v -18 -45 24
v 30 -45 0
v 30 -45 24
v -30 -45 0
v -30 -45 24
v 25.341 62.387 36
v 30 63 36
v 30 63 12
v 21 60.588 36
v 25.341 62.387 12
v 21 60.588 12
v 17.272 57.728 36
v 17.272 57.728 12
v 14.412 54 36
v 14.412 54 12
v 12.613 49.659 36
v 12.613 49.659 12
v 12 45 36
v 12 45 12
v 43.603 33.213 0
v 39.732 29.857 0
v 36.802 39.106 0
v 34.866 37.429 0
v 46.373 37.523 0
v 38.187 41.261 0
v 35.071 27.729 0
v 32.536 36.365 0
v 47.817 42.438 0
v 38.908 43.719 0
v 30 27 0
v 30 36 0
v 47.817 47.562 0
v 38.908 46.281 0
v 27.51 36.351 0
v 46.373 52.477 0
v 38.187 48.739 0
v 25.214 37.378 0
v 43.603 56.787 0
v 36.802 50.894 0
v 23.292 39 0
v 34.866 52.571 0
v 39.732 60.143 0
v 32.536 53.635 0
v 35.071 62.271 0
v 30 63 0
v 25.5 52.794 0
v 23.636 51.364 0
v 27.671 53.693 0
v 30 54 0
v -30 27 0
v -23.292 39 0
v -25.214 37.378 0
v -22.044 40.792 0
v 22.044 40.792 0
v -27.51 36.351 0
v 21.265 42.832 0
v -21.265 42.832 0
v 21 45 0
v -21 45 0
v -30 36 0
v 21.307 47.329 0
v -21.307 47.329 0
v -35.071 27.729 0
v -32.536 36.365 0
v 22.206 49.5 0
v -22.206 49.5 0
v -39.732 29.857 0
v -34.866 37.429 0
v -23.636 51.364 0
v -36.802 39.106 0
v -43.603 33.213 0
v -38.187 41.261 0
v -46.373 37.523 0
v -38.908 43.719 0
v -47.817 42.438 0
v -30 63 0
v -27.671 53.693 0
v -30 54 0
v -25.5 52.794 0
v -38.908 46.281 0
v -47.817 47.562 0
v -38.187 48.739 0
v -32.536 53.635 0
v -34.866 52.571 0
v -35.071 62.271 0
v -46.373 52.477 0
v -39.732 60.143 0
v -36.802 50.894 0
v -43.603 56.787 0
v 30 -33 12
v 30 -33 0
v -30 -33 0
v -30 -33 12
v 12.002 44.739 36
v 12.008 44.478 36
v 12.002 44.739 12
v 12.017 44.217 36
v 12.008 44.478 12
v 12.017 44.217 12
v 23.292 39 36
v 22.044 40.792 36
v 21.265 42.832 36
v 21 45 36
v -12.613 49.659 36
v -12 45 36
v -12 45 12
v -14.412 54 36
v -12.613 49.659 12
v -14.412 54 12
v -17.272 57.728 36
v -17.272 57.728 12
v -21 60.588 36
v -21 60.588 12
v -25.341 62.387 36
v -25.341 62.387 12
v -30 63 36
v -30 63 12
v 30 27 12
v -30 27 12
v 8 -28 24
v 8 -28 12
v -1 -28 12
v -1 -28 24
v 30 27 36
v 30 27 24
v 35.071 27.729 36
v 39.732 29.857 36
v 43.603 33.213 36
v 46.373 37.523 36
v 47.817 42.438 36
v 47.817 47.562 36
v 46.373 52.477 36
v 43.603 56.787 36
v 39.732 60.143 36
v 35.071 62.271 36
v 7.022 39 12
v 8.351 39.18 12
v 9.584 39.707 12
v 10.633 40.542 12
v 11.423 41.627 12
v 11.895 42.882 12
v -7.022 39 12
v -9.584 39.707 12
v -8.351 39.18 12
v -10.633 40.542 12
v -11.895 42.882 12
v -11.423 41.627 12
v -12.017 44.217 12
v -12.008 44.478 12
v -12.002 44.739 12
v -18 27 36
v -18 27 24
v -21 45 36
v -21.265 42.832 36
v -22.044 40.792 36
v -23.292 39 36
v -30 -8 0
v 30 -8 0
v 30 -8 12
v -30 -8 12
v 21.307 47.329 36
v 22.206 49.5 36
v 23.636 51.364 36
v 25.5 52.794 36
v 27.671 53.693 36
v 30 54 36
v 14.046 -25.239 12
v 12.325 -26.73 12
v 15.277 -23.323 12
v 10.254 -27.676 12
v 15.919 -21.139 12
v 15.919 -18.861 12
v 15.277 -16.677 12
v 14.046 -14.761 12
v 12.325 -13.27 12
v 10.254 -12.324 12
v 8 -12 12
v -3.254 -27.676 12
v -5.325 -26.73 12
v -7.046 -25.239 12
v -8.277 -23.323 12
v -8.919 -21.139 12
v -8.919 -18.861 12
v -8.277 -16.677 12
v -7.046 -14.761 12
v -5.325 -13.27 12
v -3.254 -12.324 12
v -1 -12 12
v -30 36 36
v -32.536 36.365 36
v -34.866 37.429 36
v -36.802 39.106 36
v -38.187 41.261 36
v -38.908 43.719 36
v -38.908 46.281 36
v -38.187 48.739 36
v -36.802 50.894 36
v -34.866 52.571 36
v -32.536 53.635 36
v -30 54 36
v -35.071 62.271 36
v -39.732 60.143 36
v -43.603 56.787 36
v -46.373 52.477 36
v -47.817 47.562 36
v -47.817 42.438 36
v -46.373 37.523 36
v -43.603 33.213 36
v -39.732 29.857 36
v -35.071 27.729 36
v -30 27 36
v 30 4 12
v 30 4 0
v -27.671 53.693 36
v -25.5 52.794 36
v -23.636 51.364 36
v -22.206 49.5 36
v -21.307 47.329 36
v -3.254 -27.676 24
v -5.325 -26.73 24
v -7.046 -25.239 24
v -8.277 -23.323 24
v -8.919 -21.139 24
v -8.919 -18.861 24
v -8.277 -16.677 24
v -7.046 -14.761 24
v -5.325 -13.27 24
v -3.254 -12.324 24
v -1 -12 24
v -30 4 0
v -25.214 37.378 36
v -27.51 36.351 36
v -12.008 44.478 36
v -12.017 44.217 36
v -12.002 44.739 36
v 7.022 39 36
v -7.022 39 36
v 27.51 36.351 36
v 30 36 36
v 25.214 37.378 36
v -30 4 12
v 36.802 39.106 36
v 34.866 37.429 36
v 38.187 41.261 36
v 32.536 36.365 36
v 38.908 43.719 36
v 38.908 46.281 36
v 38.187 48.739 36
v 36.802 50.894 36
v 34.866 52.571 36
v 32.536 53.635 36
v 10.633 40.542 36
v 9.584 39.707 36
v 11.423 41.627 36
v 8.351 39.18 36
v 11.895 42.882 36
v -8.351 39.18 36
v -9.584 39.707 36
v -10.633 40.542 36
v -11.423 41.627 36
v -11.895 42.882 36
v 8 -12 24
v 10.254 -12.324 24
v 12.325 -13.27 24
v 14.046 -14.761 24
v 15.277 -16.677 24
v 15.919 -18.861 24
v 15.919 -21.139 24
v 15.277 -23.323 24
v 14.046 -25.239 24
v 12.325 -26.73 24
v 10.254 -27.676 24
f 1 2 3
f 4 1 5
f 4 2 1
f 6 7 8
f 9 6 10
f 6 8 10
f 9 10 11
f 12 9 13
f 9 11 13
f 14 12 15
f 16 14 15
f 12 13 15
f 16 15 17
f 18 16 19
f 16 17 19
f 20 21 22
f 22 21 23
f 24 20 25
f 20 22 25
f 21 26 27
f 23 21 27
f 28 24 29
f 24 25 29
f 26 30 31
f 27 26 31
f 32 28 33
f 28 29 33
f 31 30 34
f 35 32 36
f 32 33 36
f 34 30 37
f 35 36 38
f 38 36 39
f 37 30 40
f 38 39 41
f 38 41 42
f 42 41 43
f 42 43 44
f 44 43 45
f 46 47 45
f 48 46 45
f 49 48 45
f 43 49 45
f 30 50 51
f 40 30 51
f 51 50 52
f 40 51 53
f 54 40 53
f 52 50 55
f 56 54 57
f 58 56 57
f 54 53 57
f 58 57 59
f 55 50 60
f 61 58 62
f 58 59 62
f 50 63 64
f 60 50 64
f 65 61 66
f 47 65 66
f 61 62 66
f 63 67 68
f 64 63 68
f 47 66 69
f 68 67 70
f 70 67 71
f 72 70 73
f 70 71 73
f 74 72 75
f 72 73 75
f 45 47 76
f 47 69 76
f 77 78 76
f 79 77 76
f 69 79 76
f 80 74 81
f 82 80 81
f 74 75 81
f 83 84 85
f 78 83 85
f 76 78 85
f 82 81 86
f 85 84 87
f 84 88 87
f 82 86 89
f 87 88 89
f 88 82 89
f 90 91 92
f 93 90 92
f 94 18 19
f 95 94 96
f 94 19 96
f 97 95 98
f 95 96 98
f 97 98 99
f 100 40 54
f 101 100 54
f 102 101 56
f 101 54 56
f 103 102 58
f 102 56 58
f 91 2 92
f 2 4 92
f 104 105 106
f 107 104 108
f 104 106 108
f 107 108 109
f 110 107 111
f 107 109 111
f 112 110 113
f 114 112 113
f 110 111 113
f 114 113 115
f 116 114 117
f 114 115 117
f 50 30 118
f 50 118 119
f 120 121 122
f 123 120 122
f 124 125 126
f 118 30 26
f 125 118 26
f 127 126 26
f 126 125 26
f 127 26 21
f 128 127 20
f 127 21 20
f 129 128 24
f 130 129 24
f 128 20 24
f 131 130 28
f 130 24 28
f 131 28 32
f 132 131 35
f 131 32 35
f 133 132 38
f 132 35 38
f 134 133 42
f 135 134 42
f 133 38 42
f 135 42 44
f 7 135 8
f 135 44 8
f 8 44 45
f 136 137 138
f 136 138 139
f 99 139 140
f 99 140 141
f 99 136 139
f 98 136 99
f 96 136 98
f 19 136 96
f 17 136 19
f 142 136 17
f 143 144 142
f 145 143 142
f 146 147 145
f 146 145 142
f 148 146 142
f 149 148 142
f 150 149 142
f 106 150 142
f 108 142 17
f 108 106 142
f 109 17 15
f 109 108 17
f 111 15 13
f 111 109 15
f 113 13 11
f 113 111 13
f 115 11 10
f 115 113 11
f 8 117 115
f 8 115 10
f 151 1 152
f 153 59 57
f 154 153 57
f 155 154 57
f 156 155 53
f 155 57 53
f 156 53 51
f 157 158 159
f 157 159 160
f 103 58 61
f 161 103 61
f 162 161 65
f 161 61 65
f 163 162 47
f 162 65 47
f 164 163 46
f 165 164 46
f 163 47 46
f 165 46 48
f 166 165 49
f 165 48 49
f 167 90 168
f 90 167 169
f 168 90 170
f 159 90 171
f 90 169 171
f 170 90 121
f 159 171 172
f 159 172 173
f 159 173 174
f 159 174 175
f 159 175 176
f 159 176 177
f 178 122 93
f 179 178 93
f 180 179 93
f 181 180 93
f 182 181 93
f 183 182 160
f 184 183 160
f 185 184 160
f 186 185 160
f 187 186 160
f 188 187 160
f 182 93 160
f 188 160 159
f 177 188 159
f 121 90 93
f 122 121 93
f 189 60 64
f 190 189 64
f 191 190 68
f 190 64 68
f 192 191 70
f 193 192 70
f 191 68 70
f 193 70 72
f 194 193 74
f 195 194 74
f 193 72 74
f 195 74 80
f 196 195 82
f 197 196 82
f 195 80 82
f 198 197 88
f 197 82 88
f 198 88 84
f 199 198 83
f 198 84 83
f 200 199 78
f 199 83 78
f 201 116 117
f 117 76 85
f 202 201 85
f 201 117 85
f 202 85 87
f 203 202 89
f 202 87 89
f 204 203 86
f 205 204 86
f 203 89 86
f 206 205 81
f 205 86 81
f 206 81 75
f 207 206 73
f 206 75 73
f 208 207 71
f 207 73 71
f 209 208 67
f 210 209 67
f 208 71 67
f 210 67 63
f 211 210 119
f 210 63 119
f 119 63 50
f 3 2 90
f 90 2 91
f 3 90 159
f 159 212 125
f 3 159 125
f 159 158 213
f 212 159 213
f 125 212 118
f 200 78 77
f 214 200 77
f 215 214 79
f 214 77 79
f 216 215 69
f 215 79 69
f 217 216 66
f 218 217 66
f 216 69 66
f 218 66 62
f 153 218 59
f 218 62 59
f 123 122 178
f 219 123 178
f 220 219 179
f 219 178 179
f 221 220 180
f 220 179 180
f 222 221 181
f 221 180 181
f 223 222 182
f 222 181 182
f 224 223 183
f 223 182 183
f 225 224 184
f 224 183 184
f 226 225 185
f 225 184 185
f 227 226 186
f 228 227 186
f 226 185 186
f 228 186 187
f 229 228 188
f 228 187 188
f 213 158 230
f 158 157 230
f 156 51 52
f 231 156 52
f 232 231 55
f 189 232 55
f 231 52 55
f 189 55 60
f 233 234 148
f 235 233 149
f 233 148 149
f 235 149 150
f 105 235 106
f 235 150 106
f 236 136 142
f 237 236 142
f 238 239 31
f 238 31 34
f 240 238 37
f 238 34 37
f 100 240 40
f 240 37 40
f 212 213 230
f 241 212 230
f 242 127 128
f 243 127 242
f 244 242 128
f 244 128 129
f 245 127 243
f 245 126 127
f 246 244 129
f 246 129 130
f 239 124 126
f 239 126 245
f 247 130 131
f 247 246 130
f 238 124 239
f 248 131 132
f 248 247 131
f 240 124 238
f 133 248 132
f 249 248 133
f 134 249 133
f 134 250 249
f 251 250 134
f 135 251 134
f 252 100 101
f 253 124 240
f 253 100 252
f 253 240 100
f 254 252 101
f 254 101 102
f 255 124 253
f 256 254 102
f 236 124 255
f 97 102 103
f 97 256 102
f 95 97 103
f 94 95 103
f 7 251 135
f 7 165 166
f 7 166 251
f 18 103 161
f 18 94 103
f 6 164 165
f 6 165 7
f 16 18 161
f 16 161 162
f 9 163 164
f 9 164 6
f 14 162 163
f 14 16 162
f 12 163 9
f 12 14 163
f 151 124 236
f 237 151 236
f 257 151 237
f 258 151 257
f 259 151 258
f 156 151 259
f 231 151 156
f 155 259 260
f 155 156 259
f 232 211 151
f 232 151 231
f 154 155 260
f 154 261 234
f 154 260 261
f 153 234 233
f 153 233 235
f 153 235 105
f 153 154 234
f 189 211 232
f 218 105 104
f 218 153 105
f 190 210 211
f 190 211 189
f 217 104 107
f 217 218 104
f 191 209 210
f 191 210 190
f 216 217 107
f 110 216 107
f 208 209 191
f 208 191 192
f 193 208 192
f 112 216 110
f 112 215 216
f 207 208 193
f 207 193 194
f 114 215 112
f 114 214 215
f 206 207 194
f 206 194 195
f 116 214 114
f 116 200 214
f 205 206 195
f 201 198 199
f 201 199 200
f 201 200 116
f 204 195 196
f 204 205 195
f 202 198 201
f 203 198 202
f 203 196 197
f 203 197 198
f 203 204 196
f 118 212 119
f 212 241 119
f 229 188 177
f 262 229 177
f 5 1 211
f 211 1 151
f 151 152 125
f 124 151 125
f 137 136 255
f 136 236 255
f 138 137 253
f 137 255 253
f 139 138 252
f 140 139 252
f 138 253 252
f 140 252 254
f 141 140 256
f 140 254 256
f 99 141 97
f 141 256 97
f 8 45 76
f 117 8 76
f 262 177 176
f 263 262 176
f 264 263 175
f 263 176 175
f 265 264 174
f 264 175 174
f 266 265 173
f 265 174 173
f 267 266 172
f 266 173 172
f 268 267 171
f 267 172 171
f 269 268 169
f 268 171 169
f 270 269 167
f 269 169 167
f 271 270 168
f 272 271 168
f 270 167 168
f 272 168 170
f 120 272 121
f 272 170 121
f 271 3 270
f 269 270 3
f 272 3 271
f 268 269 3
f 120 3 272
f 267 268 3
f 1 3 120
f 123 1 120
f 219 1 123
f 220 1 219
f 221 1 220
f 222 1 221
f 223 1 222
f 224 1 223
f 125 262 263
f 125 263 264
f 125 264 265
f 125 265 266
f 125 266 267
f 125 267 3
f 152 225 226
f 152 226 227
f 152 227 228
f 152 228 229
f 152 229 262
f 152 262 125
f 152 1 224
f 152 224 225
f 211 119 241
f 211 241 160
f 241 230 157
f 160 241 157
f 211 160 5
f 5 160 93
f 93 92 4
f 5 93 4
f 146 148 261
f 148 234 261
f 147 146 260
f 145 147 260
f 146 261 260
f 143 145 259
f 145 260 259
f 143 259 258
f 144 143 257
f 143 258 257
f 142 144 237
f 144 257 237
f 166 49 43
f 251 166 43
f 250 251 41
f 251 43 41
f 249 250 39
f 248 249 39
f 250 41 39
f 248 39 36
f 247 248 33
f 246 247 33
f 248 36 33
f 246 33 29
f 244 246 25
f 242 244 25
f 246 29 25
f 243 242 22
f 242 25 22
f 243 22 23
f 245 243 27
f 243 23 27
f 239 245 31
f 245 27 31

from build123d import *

# Parameters (mm, degrees)
SKETCH1_R           = 9
BOSS_EXTRUDE1_DEPTH = 36
BOSS_EXTRUDE2_DEPTH = 12
SKETCH1_6_W         = 72
SKETCH1_6_H         = 60
BOSS_EXTRUDE4_DEPTH = 24
SKETCH1_8_W         = 23
SKETCH1_8_H         = 60
SKETCH1_8_W_2       = 25
CUT_EXTRUDE2_DEPTH  = 12
BOSS_EXTRUDE5_START = 24
SKETCH1_10_W        = 72
SKETCH1_10_H        = 12
BOSS_EXTRUDE5_DEPTH = 12
CUT_EXTRUDE3_DEPTH  = 12
FILLET1_R           = 5


with BuildPart() as part:
    # Sketch1 → Boss-Extrude1 (new body)
    with BuildSketch(Plane(origin=(0, 0, 0), x_dir=(0, 1, 0), z_dir=(0, 0, 1))):
        with BuildLine():
            Line((39, -13.029437252), (39, 13.029437252))
            ThreePointArc((39, 13.029437252), (59.696938457, 40.392304845), (27, 30))
            Line((27, 30), (27, -30))
            ThreePointArc((27, -30), (59.696938457, -40.392304845), (39, -13.029437252))
        make_face()
        with Locations((45, 30)):
            Circle(SKETCH1_R, mode=Mode.SUBTRACT)
        with Locations((45, -30)):
            Circle(SKETCH1_R, mode=Mode.SUBTRACT)
    extrude(amount=BOSS_EXTRUDE1_DEPTH)

    # Sketch1<4> → Boss-Extrude2 (add)
    with BuildSketch(Plane(origin=(0, 0, 0), x_dir=(0, 1, 0), z_dir=(0, 0, 1))):
        with BuildLine():
            Line((63, -30), (63, 30))
            ThreePointArc((63, 30), (55.392304845, 15.303061543), (39, 13.029437252))
            Line((39, 13.029437252), (39, -13.029437252))
            ThreePointArc((39, -13.029437252), (55.392304845, -15.303061543), (63, -30))
        make_face()
    extrude(amount=BOSS_EXTRUDE2_DEPTH)

    # Sketch1<6> → Boss-Extrude4 (add)
    with BuildSketch(Plane(origin=(0, 0, 0), x_dir=(0, 1, 0), z_dir=(0, 0, 1))):
        with Locations((-9, 0)):
            Rectangle(SKETCH1_6_W, SKETCH1_6_H)
        with BuildLine():
            ThreePointArc((-28, 1), (-20, 9), (-12, 1))
            Line((-12, 1), (-12, -8))
            ThreePointArc((-12, -8), (-20, -16), (-28, -8))
            Line((-28, -8), (-28, 1))
        make_face(mode=Mode.SUBTRACT)
    extrude(amount=BOSS_EXTRUDE4_DEPTH)

    # Sketch1<8> → Cut-Extrude2 (cut)
    # profile 1 of 2: a face of its own
    with BuildSketch(Plane(origin=(0, 0, 0), x_dir=(0, 1, 0), z_dir=(0, 0, 1))):
        with Locations((15.5, 0)):
            Rectangle(SKETCH1_8_W, SKETCH1_8_H)
    # profile 2 of 2: a face of its own
    with BuildSketch(Plane(origin=(0, 0, 0), x_dir=(0, 1, 0), z_dir=(0, 0, 1))):
        with Locations((-20.5, 0)):
            Rectangle(SKETCH1_8_W_2, SKETCH1_8_H)
        with BuildLine():
            ThreePointArc((-28, 1), (-20, 9), (-12, 1))
            Line((-12, 1), (-12, -8))
            ThreePointArc((-12, -8), (-20, -16), (-28, -8))
            Line((-28, -8), (-28, 1))
        make_face(mode=Mode.SUBTRACT)
    extrude(amount=CUT_EXTRUDE2_DEPTH, mode=Mode.SUBTRACT)

    # Sketch1<10> → Boss-Extrude5 (add)
    with BuildSketch(Plane(origin=(0, 0, 0), x_dir=(0, 1, 0), z_dir=(0, 0, 1)).offset(BOSS_EXTRUDE5_START)):
        with Locations((-9, 24)):
            Rectangle(SKETCH1_10_W, SKETCH1_10_H)
    extrude(amount=BOSS_EXTRUDE5_DEPTH)

    # Sketch2 → Cut-Extrude3 (cut)
    with BuildSketch(Plane.YZ.offset(-18)):
        Polygon((-45, 36), (-45, 24), (27, 36), align=None)
    extrude(amount=-CUT_EXTRUDE3_DEPTH, mode=Mode.SUBTRACT)

    # Fillet1
    fillet1_edges = [part.edges().sort_by_distance(p)[0] for p in [
        (-13.029437252, 39, 24),
        (13.029437252, 39, 24),
    ]]
    fillet(fillet1_edges, radius=FILLET1_R)


solid = part.part
